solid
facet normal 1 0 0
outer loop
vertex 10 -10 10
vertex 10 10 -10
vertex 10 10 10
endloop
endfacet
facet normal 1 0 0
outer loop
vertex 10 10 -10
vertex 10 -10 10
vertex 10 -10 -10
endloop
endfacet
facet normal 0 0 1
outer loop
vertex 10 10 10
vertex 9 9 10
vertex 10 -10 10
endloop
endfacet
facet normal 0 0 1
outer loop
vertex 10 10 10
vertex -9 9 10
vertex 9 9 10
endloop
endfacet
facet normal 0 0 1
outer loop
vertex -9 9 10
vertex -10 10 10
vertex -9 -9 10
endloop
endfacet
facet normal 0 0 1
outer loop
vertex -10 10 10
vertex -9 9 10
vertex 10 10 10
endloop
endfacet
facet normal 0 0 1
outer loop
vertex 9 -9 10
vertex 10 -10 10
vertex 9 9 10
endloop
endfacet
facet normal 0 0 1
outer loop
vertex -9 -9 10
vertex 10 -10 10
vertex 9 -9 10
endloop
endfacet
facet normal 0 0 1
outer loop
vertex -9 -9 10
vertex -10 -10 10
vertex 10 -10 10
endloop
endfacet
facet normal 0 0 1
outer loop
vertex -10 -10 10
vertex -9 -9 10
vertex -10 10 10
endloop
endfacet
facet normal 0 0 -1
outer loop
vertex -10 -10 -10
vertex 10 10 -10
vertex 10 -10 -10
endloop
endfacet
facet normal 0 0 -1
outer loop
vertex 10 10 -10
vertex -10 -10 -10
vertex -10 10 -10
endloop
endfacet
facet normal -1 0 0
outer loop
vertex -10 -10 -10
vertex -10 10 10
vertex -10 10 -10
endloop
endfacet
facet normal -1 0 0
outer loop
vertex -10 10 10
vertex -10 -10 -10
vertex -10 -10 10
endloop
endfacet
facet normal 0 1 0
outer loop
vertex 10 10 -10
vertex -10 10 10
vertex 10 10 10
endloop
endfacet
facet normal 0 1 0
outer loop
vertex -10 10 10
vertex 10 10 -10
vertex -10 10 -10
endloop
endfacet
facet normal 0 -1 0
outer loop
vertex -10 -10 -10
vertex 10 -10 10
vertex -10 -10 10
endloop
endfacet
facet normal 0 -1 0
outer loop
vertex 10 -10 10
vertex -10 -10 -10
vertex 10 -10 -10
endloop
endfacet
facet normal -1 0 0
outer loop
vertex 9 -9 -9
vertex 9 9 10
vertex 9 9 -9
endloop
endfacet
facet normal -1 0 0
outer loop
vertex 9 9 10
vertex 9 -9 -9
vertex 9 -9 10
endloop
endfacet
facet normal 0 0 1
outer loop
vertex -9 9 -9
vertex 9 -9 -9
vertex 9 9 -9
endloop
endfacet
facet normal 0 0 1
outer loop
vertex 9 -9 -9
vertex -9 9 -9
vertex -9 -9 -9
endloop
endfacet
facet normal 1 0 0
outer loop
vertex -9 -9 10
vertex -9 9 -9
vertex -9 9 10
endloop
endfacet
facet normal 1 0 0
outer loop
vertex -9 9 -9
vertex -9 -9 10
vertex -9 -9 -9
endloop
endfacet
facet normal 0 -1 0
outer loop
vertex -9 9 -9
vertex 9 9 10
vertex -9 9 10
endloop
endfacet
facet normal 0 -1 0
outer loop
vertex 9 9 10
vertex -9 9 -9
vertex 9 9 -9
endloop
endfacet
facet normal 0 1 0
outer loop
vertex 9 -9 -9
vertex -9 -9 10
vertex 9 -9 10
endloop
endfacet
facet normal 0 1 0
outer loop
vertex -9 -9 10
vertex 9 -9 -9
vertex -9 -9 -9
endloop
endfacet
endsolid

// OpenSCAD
module box_section() {
    difference() {
        cube([20, 20, 20], center=true);
        translate([-9, -9, -9])
            cube([18, 18, 22], center=false);
    }
}

box_section();
